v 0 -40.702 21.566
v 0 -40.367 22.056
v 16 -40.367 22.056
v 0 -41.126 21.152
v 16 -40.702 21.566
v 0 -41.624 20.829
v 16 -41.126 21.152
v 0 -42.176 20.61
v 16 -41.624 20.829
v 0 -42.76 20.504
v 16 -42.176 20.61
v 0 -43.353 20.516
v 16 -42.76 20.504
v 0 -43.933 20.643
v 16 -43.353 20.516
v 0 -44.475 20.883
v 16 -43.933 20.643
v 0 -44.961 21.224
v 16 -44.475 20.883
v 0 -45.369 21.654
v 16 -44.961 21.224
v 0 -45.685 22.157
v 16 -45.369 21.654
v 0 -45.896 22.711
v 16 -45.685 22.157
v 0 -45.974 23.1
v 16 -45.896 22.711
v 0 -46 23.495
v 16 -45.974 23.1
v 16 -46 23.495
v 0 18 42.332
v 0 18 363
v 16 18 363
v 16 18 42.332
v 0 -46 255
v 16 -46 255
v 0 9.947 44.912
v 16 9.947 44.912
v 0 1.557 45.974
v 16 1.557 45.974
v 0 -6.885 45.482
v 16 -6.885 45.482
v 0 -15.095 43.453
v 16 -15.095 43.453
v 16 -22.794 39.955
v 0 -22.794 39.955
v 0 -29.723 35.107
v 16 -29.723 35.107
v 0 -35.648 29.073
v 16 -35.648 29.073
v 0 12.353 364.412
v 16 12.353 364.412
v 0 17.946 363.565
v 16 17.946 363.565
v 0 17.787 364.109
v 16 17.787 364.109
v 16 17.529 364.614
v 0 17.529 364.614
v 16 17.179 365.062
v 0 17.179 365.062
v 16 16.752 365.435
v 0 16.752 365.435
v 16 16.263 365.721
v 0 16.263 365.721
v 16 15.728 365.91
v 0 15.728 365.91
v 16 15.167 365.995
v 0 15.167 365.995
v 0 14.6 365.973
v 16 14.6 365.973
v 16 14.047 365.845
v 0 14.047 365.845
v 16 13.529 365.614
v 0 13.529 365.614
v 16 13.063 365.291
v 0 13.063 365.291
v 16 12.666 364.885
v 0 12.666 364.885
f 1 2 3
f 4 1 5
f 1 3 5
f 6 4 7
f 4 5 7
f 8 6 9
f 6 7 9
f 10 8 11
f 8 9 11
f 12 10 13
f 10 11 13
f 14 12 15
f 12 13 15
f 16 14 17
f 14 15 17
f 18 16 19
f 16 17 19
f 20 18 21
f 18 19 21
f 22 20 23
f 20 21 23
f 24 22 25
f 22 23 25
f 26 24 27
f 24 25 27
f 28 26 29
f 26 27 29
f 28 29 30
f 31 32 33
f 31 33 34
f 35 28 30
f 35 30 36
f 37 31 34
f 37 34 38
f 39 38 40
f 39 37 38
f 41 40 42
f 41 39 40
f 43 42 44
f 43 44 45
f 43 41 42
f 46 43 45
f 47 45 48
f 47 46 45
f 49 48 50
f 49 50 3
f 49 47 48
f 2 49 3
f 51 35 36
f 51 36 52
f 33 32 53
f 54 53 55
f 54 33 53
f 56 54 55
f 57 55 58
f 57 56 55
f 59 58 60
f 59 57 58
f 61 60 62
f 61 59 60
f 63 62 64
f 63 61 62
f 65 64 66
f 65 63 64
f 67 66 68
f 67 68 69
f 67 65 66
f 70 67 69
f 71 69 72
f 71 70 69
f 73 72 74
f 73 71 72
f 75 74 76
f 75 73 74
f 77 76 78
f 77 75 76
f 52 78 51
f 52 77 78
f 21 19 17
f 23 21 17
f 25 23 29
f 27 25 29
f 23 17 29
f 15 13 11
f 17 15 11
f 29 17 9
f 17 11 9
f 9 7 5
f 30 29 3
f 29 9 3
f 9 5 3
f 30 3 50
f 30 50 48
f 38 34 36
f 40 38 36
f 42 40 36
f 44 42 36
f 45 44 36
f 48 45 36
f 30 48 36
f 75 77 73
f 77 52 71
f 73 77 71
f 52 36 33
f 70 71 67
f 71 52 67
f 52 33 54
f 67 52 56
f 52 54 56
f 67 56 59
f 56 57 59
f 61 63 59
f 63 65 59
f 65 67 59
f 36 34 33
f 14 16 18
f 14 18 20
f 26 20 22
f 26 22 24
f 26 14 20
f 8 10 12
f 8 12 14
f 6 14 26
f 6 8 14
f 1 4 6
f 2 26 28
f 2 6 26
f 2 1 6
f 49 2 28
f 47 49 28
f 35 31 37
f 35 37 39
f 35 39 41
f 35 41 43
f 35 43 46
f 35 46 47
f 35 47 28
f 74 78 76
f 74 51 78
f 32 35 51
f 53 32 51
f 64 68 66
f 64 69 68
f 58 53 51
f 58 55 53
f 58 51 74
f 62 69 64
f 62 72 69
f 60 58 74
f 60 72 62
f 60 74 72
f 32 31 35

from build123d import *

# Parameters (mm, degrees)
EXTRUDE_1_DEPTH = 16
FILLET_1_R      = 3


with BuildPart() as part:
    # 草图1 → 凸台-拉伸1 (new body)
    with BuildSketch(Plane(origin=(0, 0, 0), x_dir=(0, 0, -1), z_dir=(1, 0, 0))):
        with BuildLine():
            Line((-375, 18), (-42.332020977, 18))
            ThreePointArc((-42.332020977, 18), (-38.366652187, -25.377155081), (0, -46))
            Line((0, -46), (-255, -46))
            Line((-255, -46), (-375, 18))
        make_face()
    extrude(amount=EXTRUDE_1_DEPTH)

    # 圆角1
    fillet_1_edges = [part.edges().sort_by_distance(p)[0] for p in [
        (8, 18, 375),
        (8, -46, 0),
    ]]
    fillet(fillet_1_edges, radius=FILLET_1_R)


solid = part.part
